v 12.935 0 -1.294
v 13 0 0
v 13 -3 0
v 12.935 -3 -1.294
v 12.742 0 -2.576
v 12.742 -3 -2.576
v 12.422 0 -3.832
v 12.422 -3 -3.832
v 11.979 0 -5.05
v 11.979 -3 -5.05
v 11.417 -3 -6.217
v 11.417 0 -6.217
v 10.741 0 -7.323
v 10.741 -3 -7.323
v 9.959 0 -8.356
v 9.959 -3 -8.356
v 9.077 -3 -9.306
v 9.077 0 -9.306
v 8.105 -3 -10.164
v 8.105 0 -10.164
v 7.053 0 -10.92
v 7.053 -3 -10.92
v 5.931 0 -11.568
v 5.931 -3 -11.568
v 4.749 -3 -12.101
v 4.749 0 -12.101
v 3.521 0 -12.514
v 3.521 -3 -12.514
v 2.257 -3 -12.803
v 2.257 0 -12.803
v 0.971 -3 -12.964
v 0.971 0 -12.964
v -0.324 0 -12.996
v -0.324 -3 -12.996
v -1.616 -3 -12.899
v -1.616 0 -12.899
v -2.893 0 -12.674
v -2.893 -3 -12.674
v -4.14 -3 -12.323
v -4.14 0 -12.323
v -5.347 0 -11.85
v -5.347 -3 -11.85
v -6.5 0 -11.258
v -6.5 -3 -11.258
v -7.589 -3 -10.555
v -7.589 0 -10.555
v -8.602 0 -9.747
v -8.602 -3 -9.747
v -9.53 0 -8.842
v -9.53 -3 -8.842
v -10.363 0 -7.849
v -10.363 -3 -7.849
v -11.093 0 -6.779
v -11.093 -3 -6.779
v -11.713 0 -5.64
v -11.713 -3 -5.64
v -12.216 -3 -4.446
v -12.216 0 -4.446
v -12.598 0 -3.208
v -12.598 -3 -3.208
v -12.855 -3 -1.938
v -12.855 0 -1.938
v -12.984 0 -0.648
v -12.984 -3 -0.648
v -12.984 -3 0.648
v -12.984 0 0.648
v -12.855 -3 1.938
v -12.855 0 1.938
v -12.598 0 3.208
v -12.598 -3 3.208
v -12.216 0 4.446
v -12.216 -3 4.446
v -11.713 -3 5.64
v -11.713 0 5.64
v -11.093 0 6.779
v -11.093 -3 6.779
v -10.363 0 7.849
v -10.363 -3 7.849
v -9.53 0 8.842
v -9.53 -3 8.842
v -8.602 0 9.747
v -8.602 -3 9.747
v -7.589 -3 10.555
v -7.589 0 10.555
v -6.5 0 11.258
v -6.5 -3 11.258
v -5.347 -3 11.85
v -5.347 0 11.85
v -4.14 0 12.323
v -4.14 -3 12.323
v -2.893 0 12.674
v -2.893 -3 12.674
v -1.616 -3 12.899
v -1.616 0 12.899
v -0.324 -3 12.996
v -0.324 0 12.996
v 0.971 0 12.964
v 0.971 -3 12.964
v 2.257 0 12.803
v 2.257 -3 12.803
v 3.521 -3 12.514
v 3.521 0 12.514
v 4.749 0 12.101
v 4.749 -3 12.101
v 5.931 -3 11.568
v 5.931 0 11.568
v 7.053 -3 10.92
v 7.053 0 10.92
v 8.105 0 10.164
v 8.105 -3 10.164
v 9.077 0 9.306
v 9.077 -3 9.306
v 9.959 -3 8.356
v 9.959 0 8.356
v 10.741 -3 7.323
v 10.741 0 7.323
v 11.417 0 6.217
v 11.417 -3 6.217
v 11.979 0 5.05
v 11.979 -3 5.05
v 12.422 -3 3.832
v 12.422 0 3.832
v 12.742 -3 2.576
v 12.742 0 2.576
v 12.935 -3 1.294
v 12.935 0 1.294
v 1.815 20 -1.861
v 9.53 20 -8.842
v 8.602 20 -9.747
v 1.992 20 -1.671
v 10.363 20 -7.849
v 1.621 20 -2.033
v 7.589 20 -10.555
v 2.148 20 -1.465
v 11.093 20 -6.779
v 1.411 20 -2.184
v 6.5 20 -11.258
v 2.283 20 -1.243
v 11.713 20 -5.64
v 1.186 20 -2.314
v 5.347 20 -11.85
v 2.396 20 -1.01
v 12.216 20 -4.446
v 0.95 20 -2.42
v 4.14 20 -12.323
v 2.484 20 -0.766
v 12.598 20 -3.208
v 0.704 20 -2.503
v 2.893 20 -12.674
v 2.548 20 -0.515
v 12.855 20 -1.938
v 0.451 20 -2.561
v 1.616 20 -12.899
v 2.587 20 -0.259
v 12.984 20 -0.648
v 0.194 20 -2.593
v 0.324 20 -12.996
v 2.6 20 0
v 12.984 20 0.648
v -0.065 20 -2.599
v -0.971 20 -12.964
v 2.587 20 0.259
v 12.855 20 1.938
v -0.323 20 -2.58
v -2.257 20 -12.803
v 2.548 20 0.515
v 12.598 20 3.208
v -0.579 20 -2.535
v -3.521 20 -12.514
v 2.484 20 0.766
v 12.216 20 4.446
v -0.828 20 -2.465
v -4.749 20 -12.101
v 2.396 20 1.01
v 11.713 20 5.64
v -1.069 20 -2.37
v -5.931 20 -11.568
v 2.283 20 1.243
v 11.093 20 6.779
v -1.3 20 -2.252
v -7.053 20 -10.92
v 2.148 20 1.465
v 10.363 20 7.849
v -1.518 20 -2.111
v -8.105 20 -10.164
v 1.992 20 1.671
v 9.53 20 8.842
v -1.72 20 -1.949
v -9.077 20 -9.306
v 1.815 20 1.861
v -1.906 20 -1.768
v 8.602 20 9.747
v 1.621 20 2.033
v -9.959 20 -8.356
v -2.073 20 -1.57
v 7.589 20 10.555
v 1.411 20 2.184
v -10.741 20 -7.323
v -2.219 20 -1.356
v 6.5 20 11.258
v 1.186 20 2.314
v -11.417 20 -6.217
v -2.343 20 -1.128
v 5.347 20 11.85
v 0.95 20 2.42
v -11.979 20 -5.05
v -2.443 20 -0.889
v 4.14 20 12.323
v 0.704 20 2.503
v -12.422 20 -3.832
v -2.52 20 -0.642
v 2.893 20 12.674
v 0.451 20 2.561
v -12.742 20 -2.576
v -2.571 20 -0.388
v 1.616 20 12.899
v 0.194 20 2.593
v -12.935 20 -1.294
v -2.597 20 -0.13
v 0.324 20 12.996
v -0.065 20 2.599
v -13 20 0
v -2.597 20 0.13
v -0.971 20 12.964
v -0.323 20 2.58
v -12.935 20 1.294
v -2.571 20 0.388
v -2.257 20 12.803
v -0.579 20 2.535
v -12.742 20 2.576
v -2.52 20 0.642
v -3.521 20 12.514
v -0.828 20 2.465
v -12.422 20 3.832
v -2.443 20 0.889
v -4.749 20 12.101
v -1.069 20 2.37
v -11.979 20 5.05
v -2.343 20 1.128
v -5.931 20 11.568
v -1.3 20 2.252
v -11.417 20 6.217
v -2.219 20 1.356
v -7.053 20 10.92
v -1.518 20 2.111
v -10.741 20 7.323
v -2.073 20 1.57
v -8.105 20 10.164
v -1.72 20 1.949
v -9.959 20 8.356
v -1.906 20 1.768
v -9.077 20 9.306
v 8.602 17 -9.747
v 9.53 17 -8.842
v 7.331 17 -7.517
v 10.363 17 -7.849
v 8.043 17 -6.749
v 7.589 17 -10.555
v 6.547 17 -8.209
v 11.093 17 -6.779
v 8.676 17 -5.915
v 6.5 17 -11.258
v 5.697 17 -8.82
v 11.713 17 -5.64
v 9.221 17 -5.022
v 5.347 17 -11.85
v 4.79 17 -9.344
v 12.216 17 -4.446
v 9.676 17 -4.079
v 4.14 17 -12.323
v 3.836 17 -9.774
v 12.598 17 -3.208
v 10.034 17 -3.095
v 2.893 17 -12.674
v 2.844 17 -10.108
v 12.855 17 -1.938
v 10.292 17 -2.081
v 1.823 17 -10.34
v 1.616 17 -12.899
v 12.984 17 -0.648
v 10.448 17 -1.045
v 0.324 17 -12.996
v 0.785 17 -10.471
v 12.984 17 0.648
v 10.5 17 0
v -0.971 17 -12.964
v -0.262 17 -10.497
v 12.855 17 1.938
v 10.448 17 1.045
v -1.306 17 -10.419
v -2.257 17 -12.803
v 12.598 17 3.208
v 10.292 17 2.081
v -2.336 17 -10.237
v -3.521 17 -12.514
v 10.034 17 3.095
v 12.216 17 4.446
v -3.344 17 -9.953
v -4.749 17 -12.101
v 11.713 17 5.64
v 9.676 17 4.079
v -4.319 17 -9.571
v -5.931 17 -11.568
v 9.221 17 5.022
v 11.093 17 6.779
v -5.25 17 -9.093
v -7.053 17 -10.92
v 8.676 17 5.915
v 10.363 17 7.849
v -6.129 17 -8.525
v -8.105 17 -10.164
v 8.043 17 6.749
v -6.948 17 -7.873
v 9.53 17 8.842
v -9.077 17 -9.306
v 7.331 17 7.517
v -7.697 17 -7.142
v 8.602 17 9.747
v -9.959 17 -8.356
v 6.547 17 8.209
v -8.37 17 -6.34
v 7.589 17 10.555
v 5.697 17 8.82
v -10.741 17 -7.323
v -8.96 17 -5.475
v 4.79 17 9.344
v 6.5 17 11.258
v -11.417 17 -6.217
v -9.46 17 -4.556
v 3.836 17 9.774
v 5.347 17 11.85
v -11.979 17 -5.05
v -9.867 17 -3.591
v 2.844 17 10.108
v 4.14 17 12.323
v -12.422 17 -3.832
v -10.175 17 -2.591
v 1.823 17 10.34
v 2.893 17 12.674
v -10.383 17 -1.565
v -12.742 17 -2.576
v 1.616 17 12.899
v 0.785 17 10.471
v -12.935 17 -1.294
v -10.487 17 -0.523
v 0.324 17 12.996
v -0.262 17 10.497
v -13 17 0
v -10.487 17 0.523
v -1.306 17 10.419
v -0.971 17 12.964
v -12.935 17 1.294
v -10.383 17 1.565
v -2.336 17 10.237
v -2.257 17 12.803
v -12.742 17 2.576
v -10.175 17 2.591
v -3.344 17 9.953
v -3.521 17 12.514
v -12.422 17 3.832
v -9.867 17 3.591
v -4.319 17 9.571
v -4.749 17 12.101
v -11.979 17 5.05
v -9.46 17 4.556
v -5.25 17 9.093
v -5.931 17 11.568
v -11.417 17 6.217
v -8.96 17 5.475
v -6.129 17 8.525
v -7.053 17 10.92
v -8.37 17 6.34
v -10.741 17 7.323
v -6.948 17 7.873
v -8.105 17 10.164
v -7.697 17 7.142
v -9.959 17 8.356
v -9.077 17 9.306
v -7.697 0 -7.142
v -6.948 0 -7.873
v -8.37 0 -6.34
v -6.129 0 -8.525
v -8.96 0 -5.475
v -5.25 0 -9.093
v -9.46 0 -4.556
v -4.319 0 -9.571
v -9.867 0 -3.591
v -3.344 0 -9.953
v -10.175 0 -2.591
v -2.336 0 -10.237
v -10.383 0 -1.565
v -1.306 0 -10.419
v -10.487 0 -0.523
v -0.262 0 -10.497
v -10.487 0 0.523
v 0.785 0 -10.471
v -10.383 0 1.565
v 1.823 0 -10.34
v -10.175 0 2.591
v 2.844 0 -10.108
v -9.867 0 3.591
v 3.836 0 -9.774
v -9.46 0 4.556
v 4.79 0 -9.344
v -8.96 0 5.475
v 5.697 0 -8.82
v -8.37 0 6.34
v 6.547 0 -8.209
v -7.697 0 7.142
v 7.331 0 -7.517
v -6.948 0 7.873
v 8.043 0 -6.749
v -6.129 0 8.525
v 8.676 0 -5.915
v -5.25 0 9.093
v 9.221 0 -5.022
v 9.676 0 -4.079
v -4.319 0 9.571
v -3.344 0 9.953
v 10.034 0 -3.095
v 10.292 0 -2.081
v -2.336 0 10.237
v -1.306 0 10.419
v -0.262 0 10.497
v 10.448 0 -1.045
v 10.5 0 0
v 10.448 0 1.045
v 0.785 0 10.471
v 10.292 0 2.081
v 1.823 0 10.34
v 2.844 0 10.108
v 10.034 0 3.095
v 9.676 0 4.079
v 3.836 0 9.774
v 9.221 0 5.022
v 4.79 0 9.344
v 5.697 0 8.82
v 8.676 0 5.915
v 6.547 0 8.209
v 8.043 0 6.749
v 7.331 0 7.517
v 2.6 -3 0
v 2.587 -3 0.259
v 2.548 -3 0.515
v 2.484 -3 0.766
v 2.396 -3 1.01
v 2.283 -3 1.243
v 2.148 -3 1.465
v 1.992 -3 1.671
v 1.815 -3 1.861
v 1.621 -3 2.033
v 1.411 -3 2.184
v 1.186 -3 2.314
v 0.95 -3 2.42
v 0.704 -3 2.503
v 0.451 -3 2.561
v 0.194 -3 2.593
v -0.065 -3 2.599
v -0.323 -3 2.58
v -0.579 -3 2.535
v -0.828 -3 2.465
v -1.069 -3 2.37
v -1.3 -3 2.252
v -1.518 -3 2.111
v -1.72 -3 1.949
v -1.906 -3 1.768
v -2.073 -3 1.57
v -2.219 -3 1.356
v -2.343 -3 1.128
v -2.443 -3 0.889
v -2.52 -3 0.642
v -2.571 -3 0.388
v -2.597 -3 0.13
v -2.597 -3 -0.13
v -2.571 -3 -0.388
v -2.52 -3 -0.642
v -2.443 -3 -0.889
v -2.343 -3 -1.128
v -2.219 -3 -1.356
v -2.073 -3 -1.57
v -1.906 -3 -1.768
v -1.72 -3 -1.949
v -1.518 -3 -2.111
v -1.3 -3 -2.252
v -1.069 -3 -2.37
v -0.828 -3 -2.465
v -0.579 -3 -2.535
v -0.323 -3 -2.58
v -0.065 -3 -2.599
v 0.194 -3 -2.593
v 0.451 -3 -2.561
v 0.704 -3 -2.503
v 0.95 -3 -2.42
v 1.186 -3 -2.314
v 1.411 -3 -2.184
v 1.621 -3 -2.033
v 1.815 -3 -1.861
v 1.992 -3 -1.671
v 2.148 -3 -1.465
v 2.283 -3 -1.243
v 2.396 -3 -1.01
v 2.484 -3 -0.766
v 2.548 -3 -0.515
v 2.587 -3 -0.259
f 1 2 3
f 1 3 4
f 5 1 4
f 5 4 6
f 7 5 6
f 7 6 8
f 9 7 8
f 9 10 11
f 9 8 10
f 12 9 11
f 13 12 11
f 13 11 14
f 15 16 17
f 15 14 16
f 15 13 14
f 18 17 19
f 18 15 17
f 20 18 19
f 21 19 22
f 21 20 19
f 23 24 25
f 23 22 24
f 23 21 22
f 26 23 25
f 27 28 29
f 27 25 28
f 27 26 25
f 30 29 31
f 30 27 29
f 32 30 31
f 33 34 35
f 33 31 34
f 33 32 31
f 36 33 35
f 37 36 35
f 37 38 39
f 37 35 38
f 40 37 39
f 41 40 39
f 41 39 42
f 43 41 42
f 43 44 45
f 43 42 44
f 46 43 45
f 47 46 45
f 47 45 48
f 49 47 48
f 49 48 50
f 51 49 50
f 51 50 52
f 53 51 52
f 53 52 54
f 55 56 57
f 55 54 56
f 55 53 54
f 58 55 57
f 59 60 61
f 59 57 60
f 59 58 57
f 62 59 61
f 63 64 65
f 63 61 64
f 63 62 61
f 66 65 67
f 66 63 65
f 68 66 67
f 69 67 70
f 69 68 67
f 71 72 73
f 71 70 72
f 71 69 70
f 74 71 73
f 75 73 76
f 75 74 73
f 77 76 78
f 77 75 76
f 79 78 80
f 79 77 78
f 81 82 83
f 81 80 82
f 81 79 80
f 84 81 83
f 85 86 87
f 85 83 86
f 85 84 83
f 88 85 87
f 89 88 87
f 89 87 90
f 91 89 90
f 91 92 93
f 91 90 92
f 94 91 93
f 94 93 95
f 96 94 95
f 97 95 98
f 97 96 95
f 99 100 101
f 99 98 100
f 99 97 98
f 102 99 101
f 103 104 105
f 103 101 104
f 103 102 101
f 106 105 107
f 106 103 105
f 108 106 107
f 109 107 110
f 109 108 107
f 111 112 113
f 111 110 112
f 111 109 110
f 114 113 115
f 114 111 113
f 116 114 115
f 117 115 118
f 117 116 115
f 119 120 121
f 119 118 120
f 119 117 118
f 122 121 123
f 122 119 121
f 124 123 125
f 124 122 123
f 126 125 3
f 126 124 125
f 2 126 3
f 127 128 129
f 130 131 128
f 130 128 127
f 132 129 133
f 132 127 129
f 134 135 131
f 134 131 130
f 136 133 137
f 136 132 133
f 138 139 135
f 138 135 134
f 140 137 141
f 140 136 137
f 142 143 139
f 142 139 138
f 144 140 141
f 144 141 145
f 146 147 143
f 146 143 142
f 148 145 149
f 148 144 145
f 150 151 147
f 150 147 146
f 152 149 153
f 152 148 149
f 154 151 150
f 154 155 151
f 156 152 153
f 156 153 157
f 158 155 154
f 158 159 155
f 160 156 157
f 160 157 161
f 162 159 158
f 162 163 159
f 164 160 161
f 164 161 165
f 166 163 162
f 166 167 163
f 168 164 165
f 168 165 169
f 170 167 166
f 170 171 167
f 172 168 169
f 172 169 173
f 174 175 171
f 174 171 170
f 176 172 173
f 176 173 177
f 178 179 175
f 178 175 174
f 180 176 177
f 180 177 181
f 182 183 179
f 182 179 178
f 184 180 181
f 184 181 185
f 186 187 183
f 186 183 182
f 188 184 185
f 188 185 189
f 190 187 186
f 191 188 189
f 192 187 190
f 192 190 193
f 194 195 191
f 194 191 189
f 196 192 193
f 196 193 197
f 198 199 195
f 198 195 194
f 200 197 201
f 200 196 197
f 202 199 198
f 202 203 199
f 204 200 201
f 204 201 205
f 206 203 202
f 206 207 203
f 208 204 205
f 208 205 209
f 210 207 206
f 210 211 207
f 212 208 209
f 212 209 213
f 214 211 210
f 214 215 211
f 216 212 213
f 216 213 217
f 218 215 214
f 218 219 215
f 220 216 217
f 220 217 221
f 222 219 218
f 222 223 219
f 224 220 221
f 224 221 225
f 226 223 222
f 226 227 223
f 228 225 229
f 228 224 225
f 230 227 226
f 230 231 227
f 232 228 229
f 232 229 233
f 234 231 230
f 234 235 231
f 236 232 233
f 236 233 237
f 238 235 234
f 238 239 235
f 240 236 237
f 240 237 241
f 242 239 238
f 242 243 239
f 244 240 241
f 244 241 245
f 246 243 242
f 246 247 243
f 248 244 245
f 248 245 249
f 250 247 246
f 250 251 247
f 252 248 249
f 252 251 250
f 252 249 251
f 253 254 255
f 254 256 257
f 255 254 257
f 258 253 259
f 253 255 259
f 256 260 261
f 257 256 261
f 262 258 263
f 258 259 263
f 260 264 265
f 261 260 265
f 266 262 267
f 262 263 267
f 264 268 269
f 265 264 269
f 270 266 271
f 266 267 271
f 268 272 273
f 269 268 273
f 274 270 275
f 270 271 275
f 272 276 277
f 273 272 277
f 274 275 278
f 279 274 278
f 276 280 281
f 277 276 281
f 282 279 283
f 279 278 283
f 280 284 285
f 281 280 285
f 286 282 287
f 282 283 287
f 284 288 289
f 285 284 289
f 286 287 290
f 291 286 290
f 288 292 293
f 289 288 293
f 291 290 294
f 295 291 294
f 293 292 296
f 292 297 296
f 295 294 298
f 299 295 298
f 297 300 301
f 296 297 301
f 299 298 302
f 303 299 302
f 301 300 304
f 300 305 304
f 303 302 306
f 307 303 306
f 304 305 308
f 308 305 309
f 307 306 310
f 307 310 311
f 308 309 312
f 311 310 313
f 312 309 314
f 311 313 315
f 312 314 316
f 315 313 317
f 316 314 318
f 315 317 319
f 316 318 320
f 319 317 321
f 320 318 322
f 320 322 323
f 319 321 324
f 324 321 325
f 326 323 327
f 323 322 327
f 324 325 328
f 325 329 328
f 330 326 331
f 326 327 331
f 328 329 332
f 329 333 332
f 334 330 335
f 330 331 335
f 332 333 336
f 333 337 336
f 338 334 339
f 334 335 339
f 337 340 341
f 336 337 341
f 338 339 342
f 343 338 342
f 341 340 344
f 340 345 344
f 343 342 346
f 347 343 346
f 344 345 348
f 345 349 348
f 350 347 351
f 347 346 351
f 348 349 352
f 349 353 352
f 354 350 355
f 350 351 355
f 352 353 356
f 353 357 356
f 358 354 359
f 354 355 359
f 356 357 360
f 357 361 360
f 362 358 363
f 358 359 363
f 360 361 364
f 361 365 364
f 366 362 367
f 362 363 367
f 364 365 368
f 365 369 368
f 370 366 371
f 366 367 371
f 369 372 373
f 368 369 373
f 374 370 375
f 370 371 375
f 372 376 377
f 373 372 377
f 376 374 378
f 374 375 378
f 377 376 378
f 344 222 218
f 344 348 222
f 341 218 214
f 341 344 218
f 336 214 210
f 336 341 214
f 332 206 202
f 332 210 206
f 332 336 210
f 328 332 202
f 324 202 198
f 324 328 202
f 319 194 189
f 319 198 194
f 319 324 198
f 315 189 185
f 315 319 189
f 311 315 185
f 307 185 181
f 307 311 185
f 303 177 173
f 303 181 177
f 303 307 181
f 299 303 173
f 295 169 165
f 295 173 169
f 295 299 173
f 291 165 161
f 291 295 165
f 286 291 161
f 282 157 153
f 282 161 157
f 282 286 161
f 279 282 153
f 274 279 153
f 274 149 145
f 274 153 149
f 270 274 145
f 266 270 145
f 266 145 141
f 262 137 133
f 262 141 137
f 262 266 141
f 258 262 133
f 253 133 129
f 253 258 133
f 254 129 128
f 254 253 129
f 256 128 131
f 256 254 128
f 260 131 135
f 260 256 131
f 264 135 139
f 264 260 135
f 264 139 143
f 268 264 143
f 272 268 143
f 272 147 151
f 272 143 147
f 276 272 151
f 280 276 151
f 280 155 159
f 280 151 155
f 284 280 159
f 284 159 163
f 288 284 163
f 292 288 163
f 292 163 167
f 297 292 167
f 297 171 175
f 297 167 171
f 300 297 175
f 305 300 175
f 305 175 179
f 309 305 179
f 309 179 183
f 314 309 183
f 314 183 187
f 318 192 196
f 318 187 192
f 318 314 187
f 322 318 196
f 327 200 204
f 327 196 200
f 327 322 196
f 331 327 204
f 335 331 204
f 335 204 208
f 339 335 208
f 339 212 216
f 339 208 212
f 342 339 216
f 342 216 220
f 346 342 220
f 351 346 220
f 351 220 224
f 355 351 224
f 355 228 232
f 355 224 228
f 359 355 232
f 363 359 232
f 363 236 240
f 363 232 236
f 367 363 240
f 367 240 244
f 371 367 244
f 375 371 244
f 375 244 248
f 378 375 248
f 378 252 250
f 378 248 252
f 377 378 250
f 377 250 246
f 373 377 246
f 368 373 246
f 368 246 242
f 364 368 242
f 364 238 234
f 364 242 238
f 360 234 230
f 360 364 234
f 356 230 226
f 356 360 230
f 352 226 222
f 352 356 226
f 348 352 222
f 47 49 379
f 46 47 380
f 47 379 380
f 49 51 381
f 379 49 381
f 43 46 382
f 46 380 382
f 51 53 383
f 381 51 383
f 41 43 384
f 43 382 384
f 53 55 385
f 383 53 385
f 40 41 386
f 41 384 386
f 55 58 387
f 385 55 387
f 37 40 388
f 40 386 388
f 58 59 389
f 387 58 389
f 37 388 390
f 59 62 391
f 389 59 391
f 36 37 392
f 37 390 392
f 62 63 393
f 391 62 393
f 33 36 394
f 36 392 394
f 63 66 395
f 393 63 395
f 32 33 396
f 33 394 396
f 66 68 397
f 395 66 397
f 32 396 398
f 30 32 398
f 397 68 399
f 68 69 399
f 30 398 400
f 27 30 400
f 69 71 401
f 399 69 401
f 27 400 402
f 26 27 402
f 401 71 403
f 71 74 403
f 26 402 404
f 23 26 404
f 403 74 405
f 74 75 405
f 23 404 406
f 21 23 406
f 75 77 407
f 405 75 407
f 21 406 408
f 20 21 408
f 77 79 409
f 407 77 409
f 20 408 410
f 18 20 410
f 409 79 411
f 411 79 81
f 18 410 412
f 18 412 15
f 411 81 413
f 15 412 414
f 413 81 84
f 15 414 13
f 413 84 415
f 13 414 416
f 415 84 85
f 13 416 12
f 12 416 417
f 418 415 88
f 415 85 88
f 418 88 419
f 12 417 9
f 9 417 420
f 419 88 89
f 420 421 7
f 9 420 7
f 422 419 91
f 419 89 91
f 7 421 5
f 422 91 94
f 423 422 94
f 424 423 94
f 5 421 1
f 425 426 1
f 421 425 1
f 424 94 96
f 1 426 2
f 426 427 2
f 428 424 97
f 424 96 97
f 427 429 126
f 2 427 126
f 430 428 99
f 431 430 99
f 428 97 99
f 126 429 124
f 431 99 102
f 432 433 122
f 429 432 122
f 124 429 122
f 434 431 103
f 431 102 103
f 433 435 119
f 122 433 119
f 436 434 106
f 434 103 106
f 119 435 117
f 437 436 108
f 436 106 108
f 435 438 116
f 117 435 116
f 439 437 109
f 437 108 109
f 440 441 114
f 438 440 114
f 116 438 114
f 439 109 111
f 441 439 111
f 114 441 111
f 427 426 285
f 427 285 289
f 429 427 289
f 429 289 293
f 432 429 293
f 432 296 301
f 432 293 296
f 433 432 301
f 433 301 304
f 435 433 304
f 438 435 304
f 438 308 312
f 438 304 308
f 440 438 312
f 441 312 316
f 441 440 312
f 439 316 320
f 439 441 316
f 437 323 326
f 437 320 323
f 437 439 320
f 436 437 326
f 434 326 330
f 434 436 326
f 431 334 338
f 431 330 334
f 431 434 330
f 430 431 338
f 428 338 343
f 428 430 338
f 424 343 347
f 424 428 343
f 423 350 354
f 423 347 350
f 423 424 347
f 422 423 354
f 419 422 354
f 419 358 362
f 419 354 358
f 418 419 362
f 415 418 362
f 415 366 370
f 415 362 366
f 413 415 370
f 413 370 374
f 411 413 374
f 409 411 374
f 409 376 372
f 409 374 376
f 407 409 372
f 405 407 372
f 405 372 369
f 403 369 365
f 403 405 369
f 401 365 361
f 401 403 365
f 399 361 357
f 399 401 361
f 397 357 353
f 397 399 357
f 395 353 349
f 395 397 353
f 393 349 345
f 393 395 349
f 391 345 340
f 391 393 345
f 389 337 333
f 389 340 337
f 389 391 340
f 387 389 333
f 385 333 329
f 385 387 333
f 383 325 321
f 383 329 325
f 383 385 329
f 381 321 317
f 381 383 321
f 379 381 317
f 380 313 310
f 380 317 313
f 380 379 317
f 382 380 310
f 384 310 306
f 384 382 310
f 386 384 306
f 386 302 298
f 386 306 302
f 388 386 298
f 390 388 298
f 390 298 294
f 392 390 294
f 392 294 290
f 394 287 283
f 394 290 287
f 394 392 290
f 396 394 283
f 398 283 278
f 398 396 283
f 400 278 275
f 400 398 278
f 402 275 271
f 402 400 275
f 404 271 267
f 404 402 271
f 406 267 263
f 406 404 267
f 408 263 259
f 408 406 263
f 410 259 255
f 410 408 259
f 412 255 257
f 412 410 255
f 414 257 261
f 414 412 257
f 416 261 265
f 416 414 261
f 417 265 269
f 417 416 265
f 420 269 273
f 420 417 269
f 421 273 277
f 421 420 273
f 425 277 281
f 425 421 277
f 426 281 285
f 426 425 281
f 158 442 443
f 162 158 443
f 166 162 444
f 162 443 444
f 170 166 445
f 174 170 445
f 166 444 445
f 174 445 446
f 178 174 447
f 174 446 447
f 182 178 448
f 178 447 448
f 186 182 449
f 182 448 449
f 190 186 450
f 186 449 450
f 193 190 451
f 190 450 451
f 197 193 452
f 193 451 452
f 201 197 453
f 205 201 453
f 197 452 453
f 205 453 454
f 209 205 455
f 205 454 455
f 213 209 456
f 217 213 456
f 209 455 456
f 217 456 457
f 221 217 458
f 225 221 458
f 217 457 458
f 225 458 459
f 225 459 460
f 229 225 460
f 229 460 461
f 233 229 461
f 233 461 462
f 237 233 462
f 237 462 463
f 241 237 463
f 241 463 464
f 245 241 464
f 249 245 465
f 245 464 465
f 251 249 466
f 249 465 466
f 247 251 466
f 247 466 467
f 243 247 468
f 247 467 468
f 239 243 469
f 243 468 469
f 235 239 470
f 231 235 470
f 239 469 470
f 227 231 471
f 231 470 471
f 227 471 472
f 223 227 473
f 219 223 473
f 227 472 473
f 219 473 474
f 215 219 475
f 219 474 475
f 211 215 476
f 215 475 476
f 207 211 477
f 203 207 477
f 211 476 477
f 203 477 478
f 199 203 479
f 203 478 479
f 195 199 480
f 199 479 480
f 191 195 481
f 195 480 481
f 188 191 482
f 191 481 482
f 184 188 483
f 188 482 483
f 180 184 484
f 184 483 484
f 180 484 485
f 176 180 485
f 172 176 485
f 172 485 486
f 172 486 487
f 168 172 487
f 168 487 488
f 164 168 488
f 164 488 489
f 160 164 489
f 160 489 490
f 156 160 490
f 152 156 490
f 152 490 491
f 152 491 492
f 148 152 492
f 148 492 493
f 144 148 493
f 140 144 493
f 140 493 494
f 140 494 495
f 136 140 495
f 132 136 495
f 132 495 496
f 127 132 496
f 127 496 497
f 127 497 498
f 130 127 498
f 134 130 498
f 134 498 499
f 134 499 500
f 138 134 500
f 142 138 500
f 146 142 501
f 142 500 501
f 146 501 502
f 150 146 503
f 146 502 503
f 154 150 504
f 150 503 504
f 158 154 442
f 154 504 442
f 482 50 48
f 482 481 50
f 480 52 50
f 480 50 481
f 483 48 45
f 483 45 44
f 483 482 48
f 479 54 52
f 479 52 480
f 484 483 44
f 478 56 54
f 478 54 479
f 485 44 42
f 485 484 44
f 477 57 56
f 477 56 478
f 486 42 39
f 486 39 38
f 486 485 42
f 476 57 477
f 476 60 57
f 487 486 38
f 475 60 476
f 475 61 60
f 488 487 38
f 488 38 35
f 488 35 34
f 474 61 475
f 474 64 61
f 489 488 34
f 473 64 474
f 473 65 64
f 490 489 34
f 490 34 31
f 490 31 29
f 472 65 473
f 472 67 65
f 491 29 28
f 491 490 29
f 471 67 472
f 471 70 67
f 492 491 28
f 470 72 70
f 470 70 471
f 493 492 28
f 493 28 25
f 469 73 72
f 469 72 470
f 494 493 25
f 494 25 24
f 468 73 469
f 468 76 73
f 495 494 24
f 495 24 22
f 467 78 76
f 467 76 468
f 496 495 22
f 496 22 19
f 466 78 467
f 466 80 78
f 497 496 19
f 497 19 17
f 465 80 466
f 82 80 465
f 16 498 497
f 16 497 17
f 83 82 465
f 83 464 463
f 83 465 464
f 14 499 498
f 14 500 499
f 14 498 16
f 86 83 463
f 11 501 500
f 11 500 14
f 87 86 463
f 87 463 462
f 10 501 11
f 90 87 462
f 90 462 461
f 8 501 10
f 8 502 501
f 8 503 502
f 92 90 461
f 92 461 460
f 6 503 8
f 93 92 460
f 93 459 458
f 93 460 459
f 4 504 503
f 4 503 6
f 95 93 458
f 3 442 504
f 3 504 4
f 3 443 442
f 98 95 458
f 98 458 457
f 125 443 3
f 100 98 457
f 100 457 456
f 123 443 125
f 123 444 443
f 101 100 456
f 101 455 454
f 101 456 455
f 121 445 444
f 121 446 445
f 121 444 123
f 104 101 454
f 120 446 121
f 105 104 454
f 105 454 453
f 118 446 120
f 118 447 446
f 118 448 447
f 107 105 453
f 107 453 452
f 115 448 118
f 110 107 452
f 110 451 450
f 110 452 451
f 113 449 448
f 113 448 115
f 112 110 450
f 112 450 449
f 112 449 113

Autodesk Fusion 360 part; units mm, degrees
sketch "Sketch1" plane through (0, 0, 0) normal (0, 1, 0) x (1, 0, 0)
  circle A0 centre (0, 0) radius 10.5
  dimension "d1" = 21
extrude "Extrude1" add sketch "Sketch1" along normal blind 17
sketch "Sketch2" plane through (0, 0, 0) normal (0, -1, 0) x (1, 0, 0)
  circle A0 centre (0, 0) radius 10.5
  circle A1 centre (0, 0) radius 13
  dimension "d4" = 26
extrude "Extrude2" add sketch "Sketch2" along normal blind 3 contours A0 | A1
sketch "Sketch3" plane through (0, 17, 0) normal (0, 1, 0) x (-1, 0, 0)
  circle A0 centre (0, 0) radius 10.5
  circle A1 centre (0, 0) radius 13
  dimension "d7" = 26
extrude "Extrude3" add sketch "Sketch3" along normal blind 3 contours A0 | A1
sketch "Sketch4" plane through (0, -3, 0) normal (0, -1, 0) x (1, 0, 0)
  circle A0 centre (0, 0) radius 13
  circle A1 centre (0, 0) radius 2.6
  dimension "d10" = 5.2
extrude "Extrude4" cut sketch "Sketch4" against normal blind 6 contours A1
extrude "Extrude5" cut sketch "Sketch4" against normal blind 23 contours A1
